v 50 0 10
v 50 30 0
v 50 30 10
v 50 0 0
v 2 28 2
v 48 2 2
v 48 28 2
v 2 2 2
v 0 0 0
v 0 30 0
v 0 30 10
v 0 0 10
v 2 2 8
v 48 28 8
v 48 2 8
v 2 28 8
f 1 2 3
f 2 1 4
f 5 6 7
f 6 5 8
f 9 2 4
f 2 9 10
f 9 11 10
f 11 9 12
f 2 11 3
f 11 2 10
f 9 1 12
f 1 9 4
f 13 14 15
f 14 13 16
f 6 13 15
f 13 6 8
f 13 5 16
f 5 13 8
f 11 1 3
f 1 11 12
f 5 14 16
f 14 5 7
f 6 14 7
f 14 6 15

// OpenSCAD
module part(x,y,z,t,cover,c)
{
    color(c)
    translate([0,0,(z-t)*cover])
    cube([x,y,t]);

    color(c/2)
    translate([0,0,t])
    linear_extrude(z-2*t)
    polygon([[cover*x,cover*y], [x,0], [x-t,t], [t+(x-2*t)*cover, t+(y-2*t)*cover], [t,y-t], [0,y]]);
}

t = 2;

part(50,30,10,t, 0, [1,0,0]);

part(50,30,10,t, 1, [0,1,0]);
